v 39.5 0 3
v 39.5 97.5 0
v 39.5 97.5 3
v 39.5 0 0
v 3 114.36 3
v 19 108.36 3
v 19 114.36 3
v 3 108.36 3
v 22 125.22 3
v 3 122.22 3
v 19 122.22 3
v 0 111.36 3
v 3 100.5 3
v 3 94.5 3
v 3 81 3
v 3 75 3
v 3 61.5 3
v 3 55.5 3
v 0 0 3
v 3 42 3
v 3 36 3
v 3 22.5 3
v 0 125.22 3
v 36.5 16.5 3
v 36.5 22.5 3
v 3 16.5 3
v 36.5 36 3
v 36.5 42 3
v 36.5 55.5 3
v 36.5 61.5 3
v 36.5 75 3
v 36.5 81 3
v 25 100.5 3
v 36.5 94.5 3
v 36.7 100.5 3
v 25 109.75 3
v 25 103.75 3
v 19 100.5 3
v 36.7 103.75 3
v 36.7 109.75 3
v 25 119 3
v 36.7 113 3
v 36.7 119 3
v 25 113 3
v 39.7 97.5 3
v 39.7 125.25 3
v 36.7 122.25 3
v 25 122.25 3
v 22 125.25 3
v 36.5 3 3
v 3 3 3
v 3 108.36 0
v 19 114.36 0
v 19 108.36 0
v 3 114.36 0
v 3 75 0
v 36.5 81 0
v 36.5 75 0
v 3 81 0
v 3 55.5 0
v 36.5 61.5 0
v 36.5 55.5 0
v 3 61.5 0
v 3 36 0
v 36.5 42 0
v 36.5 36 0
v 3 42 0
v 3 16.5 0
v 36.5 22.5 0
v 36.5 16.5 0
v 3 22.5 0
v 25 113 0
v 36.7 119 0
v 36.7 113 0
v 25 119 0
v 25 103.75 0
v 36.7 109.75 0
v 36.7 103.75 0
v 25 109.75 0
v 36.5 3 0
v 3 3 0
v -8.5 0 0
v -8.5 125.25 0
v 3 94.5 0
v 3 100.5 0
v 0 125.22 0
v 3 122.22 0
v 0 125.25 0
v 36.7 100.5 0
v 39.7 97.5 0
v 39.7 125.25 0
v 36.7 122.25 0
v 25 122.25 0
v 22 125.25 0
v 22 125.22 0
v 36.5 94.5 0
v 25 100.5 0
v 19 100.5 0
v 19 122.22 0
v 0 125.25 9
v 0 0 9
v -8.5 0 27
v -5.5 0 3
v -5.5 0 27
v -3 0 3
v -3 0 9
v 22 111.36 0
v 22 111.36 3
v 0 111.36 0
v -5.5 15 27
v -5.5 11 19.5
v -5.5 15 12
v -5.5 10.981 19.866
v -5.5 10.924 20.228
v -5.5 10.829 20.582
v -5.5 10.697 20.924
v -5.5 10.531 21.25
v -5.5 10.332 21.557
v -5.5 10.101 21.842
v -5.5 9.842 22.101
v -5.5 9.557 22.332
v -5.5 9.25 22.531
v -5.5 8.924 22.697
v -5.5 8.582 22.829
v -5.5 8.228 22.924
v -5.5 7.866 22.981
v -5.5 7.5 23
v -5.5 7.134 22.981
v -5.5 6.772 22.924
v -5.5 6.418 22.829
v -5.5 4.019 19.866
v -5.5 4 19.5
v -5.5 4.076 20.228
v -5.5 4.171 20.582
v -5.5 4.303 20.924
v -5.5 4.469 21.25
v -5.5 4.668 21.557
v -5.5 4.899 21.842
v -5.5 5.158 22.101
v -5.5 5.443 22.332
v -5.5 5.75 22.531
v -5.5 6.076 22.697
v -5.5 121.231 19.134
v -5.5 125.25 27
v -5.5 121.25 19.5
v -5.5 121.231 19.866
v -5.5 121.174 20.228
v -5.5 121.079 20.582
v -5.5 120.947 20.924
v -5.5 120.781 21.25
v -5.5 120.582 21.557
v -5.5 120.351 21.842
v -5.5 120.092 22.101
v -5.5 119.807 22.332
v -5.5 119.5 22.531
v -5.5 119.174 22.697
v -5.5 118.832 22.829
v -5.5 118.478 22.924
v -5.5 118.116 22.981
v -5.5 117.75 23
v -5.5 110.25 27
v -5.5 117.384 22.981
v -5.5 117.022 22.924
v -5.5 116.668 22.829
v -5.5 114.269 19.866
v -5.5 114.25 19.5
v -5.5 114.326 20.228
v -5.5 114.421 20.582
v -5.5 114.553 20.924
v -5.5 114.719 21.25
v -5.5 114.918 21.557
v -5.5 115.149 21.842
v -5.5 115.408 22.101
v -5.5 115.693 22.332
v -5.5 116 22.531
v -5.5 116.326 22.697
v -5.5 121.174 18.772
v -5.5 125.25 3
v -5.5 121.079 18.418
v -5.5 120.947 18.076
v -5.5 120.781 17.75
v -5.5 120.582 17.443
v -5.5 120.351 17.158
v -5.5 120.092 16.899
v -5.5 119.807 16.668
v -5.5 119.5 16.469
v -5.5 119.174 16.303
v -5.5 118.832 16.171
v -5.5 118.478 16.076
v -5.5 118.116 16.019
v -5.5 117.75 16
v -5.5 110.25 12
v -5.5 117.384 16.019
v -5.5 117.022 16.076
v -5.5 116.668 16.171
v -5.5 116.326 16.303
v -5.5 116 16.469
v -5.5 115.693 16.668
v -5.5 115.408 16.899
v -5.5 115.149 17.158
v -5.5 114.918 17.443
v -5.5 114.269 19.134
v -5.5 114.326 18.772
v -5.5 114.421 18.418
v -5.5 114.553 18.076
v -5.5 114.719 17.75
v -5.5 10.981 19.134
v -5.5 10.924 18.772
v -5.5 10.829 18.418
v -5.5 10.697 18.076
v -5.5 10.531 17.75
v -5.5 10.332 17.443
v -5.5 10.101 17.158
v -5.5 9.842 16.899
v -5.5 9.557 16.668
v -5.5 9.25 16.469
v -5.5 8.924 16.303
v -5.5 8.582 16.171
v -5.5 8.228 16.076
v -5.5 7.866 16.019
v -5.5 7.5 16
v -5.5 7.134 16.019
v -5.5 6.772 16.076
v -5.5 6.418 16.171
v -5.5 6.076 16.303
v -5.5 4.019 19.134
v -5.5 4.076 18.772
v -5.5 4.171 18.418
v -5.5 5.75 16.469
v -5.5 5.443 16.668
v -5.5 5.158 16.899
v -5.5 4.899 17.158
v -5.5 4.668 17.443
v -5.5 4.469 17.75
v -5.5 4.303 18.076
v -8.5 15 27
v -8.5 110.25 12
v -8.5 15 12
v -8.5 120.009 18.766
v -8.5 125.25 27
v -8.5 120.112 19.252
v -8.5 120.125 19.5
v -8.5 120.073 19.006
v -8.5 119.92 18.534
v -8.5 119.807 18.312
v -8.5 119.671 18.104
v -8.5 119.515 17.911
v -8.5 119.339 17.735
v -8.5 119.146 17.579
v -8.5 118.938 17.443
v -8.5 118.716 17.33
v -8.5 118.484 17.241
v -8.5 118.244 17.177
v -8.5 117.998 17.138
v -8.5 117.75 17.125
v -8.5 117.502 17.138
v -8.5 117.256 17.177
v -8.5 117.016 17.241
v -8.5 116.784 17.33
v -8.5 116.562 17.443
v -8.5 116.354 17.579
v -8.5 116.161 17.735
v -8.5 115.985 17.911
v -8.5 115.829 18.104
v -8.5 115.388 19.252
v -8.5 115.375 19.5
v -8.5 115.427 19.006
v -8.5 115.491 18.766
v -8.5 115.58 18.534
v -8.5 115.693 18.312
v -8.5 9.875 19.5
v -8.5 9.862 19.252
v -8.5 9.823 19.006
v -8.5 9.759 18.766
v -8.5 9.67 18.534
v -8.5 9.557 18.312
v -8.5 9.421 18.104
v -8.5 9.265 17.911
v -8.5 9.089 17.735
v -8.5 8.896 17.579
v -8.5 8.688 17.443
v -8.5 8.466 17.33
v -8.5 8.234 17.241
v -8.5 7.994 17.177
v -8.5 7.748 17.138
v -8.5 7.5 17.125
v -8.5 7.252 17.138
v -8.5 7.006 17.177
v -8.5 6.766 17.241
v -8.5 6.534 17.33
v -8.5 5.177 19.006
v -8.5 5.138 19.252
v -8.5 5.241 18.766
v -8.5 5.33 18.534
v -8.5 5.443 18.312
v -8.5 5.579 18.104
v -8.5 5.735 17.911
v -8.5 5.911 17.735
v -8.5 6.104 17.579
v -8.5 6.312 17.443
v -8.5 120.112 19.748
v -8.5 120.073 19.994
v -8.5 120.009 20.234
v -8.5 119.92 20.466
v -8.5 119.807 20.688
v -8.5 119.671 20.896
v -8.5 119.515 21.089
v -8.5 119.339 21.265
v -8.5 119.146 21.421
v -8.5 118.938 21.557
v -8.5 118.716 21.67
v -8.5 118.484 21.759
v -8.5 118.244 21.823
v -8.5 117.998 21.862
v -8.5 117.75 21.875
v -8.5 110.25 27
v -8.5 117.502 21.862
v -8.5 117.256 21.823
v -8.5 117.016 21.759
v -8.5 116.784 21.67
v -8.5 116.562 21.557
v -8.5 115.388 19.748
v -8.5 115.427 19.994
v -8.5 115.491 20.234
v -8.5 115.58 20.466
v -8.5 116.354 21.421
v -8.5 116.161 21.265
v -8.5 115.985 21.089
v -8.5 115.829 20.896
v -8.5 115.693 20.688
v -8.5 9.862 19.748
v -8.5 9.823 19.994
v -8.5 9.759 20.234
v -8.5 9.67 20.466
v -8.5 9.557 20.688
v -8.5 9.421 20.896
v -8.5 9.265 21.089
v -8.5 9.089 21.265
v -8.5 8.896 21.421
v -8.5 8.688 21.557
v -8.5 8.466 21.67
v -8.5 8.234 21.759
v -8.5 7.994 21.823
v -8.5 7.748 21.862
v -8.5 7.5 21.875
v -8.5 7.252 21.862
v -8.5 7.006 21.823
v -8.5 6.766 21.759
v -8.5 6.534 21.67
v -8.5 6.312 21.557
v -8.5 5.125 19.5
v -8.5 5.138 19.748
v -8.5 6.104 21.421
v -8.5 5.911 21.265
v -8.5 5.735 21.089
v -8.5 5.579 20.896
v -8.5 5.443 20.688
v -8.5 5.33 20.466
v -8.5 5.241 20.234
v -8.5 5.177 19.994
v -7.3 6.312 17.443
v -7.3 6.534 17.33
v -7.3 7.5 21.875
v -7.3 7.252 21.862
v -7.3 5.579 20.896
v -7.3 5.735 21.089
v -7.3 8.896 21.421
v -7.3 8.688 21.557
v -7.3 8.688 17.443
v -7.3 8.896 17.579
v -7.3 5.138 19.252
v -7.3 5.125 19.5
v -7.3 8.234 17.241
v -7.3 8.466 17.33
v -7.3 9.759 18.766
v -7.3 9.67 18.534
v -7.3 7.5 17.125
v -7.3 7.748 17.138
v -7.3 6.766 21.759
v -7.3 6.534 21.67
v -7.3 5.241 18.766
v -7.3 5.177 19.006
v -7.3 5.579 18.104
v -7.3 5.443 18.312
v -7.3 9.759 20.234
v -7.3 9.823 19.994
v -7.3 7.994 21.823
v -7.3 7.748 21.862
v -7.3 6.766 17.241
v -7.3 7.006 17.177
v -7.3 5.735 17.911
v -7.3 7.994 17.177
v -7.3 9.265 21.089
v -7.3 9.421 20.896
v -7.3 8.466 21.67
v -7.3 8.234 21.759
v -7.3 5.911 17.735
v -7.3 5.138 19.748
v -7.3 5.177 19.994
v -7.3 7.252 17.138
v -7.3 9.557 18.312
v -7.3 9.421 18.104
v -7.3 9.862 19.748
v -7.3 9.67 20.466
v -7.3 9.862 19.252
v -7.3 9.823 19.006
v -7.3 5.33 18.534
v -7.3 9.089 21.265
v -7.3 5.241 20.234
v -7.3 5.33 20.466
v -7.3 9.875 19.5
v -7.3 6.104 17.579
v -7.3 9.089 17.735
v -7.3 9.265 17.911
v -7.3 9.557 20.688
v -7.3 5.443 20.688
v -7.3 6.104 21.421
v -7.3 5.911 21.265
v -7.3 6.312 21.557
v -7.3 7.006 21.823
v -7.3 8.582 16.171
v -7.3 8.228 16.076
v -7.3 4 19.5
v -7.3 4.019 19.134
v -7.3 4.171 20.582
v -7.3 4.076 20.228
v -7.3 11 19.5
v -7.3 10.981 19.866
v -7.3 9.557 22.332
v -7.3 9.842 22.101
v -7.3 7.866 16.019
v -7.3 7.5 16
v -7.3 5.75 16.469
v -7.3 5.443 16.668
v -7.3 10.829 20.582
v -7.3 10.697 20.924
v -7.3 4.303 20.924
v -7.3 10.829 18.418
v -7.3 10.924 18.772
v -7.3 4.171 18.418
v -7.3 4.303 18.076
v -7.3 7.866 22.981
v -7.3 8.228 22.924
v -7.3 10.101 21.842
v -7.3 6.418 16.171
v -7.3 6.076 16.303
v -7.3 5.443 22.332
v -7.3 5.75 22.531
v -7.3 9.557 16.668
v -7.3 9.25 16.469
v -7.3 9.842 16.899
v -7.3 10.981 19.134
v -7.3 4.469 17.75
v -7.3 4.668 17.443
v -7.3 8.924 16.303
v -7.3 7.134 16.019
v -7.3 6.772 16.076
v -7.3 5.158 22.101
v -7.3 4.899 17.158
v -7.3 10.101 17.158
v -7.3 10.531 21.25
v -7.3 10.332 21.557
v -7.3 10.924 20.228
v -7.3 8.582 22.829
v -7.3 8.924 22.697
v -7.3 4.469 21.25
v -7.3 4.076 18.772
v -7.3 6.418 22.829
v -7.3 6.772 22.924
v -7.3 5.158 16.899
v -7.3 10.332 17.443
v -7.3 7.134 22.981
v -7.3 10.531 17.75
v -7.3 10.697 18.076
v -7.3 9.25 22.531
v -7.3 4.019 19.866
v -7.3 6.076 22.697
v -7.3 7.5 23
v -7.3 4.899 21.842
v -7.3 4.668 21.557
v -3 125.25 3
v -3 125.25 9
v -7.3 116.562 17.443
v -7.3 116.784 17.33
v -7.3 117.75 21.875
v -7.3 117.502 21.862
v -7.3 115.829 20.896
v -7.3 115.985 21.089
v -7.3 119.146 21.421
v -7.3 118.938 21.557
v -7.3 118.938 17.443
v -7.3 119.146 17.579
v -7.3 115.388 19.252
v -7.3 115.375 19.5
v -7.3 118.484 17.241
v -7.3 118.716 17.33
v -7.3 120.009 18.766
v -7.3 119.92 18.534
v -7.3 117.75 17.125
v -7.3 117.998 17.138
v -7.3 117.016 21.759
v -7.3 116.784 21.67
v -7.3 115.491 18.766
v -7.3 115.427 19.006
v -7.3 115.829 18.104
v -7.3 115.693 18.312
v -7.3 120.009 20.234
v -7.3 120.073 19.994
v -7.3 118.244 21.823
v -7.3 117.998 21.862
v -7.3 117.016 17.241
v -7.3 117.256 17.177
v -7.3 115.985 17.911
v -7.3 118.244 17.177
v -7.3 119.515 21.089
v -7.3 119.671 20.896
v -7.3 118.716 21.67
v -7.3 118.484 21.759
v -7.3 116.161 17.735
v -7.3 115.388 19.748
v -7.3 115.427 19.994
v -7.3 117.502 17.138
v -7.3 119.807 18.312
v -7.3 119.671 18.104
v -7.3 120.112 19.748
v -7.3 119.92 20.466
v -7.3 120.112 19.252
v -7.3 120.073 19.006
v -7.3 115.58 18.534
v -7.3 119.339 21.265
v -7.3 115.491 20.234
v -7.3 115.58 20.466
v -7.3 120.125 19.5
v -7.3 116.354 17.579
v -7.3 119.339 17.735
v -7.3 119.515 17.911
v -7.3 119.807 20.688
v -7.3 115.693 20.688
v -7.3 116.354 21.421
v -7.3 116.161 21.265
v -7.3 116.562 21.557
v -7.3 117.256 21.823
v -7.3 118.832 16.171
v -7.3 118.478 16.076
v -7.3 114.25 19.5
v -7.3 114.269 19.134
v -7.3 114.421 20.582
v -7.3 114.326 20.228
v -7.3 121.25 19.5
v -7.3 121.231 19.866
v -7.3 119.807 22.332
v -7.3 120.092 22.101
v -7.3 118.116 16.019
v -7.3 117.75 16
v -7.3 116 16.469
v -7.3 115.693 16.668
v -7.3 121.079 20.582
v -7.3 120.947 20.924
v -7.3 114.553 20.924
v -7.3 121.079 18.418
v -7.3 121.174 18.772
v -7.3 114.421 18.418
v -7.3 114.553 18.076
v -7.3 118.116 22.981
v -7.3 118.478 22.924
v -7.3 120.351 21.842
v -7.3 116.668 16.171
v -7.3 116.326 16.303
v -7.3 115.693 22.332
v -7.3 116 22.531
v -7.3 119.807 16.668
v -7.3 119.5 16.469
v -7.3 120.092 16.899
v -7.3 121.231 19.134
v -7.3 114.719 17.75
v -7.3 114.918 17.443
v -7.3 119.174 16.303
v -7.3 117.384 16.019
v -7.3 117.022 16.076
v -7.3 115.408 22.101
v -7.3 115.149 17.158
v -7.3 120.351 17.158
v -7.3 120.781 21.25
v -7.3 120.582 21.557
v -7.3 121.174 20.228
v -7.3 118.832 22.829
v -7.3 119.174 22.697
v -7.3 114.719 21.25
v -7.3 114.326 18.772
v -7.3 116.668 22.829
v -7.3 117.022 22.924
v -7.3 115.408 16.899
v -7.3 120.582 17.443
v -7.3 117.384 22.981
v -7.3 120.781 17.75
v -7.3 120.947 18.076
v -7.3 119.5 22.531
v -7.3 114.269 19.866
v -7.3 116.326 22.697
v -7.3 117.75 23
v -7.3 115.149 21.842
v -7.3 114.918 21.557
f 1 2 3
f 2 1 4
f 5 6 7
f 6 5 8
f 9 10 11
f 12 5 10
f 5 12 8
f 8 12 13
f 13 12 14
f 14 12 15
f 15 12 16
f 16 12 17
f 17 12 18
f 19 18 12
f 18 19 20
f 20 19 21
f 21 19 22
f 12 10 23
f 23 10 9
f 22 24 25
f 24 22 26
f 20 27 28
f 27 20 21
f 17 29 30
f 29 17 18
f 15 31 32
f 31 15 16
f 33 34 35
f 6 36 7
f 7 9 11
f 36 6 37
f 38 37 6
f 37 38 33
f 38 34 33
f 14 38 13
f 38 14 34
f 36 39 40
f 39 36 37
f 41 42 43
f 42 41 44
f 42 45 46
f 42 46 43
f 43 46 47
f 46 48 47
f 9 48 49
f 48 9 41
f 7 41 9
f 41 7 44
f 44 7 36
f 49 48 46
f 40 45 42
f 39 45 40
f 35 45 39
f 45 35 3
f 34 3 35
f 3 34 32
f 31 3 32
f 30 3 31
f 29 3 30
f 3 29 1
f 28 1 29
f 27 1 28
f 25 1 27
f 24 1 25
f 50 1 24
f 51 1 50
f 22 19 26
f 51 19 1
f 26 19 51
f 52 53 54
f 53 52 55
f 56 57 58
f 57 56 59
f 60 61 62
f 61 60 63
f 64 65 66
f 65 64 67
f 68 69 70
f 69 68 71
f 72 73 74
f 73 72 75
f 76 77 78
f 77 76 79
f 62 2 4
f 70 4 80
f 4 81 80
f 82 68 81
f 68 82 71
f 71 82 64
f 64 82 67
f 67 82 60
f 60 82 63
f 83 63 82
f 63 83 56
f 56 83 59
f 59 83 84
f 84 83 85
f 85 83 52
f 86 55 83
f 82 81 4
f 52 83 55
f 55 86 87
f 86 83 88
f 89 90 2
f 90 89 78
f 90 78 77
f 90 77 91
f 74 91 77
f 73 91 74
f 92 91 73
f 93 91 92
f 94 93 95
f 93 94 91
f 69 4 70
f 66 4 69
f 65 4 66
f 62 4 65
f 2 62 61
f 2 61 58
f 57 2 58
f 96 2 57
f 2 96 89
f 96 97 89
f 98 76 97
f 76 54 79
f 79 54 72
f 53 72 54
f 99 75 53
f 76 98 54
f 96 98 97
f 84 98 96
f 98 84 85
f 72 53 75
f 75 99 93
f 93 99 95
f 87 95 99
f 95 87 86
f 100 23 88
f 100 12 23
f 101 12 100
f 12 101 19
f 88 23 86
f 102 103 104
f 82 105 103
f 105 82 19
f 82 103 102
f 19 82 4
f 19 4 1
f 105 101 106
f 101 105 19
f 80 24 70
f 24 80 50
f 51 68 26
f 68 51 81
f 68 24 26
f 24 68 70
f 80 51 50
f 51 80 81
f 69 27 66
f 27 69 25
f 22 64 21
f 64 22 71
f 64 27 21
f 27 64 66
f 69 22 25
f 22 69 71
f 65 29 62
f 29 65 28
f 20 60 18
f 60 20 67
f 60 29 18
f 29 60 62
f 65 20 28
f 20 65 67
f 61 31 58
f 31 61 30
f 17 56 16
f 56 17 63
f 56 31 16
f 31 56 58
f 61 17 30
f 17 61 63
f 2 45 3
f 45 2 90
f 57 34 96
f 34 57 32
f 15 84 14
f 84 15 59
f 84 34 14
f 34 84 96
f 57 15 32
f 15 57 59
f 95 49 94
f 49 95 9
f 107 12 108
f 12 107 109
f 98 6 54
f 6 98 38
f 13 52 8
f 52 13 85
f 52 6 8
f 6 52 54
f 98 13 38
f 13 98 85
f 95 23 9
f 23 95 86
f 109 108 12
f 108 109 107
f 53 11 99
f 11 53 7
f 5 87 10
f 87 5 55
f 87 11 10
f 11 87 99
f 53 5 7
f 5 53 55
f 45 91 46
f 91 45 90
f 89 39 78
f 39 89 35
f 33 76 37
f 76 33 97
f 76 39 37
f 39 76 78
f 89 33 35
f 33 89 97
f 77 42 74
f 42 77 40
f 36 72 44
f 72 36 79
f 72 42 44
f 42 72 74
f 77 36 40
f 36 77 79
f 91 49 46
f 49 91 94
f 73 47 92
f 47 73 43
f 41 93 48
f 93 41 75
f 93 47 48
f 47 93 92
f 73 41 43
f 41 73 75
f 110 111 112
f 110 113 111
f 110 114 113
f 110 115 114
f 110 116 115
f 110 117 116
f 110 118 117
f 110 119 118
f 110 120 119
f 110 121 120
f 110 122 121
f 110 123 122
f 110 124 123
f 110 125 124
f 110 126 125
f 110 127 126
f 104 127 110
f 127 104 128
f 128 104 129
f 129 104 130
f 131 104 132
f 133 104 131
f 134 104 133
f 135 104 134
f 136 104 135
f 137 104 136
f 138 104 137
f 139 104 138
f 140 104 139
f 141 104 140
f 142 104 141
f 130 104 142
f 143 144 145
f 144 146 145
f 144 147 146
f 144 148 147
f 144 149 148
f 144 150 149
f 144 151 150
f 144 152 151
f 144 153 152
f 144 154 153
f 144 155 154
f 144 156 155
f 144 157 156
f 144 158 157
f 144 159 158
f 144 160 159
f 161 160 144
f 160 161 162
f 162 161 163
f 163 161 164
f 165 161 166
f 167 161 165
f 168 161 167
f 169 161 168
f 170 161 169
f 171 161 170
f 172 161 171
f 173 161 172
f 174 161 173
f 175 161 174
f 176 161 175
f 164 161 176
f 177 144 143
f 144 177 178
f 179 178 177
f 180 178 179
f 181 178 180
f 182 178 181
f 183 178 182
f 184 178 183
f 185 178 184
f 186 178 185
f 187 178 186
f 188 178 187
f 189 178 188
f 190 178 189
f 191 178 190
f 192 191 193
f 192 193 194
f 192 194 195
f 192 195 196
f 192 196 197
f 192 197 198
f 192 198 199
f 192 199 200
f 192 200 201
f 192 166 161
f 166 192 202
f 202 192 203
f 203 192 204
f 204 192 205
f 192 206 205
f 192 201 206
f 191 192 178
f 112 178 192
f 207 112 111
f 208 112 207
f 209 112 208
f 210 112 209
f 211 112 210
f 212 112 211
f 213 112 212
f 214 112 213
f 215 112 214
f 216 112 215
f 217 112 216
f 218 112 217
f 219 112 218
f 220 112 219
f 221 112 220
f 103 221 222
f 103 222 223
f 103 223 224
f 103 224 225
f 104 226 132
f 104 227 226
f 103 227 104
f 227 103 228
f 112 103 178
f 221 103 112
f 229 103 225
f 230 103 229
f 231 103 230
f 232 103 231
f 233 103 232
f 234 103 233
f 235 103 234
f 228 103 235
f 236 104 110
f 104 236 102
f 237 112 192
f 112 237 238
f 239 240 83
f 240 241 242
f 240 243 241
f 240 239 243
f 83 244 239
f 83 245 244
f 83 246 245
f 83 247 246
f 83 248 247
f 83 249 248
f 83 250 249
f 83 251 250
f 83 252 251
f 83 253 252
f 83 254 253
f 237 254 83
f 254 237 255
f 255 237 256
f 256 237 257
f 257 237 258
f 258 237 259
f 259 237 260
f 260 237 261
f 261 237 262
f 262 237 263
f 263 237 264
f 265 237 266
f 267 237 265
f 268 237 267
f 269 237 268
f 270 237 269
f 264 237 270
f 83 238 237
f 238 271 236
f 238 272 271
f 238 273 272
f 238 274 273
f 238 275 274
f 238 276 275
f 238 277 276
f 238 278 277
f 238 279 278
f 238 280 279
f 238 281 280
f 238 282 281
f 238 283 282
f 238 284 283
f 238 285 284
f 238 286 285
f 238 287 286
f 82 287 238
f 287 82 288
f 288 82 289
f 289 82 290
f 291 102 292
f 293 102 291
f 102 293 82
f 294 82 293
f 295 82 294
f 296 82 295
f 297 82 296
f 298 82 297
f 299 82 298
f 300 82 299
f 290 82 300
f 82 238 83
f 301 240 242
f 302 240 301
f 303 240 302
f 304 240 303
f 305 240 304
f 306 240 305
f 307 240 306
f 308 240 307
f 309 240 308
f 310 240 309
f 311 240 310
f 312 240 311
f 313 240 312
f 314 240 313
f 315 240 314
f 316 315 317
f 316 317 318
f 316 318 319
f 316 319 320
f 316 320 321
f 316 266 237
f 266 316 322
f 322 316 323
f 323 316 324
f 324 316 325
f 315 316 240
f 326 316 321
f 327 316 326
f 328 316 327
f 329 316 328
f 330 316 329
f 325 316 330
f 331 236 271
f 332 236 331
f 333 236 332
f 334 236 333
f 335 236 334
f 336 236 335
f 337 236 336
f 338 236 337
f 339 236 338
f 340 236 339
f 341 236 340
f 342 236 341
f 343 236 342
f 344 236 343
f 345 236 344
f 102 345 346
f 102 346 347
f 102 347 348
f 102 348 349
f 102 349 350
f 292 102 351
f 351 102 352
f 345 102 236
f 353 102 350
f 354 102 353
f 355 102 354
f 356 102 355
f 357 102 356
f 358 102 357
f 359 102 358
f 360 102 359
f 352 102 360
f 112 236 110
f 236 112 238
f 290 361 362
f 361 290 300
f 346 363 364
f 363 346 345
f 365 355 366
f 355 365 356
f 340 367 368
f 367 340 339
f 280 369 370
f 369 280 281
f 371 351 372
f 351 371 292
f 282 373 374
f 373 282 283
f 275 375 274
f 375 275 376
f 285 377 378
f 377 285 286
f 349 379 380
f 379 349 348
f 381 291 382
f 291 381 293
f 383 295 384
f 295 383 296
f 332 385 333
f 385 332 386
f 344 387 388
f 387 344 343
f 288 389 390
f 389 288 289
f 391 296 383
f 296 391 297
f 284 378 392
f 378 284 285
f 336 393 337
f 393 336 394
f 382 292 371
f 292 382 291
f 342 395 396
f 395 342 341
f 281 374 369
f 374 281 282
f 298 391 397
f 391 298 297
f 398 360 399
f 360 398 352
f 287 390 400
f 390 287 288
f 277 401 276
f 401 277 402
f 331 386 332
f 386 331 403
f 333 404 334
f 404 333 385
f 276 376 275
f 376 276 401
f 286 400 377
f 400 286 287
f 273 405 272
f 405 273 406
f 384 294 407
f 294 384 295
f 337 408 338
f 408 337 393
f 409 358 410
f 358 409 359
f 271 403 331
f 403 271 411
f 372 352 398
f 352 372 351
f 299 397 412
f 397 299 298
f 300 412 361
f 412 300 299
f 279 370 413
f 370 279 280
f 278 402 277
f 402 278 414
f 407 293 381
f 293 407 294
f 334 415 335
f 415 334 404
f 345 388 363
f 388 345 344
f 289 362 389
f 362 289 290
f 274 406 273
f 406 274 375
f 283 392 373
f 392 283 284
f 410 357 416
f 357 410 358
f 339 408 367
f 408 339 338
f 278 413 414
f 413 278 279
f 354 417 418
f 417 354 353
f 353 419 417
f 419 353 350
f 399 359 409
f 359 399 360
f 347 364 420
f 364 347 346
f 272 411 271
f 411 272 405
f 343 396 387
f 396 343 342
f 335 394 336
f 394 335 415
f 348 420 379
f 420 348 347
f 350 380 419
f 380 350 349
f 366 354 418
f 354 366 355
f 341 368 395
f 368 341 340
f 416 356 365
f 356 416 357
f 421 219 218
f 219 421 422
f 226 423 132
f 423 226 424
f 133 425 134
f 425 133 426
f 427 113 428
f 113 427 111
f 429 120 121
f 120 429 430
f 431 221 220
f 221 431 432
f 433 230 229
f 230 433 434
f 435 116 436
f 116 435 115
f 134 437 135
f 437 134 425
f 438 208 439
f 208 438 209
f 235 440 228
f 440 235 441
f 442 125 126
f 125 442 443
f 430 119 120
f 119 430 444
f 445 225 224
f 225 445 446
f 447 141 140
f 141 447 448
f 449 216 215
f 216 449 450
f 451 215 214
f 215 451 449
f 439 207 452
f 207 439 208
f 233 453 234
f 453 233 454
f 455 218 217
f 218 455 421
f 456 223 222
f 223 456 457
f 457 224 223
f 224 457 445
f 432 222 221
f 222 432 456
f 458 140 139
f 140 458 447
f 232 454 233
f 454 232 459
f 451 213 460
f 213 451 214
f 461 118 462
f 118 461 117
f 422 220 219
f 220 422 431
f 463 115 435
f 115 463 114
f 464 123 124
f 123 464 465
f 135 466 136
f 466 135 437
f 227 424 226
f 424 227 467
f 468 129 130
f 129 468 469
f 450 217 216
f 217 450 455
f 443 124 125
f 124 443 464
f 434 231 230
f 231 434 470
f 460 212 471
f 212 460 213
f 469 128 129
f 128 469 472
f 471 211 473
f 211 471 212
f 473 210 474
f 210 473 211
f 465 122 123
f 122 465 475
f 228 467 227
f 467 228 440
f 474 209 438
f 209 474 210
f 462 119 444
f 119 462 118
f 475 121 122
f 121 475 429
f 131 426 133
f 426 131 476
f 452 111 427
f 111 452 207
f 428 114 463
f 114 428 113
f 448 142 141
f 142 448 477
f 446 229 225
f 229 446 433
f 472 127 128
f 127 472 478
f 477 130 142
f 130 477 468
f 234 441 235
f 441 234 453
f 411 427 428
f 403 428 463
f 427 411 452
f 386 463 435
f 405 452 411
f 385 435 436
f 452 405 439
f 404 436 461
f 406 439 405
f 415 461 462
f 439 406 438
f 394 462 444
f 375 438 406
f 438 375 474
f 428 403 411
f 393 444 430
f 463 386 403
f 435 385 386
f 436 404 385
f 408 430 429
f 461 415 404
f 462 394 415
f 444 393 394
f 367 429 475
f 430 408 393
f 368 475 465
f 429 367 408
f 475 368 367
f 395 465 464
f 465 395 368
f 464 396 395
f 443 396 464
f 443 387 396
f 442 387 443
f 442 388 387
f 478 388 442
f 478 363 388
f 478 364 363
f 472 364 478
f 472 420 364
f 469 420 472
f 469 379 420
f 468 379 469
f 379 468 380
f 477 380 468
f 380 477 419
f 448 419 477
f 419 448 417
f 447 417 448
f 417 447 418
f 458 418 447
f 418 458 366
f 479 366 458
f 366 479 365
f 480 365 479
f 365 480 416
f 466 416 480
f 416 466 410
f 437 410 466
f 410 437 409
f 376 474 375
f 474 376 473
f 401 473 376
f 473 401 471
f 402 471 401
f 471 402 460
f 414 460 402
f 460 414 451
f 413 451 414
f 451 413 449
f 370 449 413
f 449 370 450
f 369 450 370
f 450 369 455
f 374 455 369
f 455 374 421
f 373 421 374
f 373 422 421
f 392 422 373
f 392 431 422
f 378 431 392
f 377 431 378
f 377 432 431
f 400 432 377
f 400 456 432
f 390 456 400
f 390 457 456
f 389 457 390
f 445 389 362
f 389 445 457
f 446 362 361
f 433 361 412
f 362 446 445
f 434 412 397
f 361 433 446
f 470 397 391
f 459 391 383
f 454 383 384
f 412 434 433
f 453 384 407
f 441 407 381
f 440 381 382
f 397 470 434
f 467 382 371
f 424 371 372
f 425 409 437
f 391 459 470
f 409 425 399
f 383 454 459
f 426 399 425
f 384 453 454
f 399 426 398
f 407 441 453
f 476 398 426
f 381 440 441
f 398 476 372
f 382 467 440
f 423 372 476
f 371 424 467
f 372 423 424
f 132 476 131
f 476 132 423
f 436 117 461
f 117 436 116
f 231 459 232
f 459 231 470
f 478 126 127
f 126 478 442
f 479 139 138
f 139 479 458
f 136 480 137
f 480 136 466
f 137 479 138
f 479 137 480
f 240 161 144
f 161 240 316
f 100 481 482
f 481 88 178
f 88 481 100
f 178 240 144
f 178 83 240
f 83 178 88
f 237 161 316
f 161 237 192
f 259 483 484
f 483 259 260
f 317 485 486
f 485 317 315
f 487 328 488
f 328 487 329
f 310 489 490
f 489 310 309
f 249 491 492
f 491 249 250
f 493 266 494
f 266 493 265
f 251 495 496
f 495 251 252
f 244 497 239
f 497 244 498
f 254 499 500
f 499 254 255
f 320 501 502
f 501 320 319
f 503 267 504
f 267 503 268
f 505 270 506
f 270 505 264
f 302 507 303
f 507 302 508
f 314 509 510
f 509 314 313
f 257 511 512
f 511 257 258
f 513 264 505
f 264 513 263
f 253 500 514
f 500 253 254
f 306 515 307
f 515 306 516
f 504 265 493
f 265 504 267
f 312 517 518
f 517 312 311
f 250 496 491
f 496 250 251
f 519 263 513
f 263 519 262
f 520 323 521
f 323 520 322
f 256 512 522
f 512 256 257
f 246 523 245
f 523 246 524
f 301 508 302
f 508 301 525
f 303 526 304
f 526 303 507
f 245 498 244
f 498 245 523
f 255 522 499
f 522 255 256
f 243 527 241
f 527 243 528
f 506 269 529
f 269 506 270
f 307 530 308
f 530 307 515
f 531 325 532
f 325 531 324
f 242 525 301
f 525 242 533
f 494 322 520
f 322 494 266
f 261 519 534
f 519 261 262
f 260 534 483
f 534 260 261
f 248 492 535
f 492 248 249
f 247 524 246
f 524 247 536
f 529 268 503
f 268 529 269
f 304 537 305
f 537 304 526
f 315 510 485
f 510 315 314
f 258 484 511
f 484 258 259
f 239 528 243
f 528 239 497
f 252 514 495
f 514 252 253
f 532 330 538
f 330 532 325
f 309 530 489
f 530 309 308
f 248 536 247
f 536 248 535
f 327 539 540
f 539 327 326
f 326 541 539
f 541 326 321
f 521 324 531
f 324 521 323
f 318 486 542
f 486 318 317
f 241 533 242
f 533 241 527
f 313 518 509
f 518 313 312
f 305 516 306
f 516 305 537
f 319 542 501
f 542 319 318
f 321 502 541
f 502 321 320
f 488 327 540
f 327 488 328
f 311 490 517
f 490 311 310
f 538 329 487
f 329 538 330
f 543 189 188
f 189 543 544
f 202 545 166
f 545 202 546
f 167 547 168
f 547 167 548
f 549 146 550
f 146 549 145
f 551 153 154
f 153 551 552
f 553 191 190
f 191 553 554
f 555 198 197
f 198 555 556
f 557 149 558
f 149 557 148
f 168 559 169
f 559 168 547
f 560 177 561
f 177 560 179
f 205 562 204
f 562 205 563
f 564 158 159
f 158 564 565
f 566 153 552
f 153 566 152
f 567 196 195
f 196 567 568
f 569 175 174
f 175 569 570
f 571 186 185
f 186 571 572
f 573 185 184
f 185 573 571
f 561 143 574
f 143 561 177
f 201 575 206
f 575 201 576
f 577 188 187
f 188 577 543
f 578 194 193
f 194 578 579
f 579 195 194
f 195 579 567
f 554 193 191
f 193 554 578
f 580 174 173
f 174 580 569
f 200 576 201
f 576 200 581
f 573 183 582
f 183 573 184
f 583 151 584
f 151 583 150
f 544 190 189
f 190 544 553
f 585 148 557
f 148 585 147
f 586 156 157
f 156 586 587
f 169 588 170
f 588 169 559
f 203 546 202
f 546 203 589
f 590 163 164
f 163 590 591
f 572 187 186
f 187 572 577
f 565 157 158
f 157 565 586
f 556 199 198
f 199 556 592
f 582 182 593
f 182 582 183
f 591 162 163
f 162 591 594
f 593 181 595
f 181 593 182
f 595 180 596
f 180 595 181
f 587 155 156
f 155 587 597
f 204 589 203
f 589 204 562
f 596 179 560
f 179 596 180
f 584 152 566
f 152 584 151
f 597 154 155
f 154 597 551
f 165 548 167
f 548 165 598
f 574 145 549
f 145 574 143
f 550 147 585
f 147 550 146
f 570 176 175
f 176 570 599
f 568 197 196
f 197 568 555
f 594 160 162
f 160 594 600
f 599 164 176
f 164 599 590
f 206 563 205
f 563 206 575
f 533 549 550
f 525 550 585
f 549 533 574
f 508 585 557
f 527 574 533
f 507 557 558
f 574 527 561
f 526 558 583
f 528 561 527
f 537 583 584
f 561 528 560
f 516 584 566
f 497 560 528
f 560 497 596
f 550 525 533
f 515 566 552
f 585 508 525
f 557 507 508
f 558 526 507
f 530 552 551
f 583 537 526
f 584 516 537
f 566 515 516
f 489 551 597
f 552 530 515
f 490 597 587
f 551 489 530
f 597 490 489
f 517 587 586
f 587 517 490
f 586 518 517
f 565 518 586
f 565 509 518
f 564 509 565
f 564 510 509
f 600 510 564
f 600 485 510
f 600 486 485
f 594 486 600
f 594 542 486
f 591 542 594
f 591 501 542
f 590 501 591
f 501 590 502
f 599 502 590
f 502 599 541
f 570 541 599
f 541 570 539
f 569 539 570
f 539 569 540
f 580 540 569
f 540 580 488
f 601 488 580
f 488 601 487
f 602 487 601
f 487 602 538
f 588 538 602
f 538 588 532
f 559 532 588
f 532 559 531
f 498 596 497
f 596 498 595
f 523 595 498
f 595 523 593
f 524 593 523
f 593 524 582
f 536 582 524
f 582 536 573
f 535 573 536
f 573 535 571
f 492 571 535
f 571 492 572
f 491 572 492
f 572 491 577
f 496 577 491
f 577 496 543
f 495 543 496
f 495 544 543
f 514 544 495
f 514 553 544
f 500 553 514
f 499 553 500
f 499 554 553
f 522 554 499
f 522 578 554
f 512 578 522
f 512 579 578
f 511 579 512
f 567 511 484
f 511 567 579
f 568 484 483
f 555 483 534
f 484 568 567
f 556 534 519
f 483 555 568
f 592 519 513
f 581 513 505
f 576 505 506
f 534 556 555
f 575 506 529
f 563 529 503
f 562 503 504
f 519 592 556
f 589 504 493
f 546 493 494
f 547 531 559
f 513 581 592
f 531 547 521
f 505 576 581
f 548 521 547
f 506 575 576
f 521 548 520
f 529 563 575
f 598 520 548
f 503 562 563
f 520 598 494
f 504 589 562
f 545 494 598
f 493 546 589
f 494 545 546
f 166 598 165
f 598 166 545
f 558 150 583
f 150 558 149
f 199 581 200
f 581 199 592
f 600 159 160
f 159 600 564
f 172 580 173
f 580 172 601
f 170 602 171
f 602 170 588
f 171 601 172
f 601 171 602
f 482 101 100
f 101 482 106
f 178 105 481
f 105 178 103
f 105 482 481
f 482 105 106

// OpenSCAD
$fn = 60;
min_tool_width = 33.5;
min_tool_thickness = 13.5;
num_tools = 5;

tweezer_width = 11.7;
tweezer_thickness = 3.25;

plat_thickness = 3;

knife_width = 16;
knife_thickness = 7.86;

// Pliers, cutters, scissors

for (i=[0:num_tools-1]) {
    translate([0,i*(plat_thickness*2+min_tool_thickness),0])
    difference(){
        cube([min_tool_width+2*plat_thickness, min_tool_thickness+2*plat_thickness, plat_thickness]);
        translate([plat_thickness,plat_thickness,-0.5])cube([min_tool_width, min_tool_thickness, plat_thickness+1]);
    }
}

// Tweezers

tool_tray_width = num_tools*(plat_thickness*2+min_tool_thickness);

for (i=[0:1]) {
    translate([0,i*(knife_thickness + 2*plat_thickness) + tool_tray_width,0])
    difference(){
        cube([knife_width+2*plat_thickness, knife_thickness+2*plat_thickness, plat_thickness]);
        translate([plat_thickness,plat_thickness,-0.5])cube([knife_width, knife_thickness, plat_thickness+1]);
    }
}

// Sharp stuff

translate([2*plat_thickness + knife_width,0,0])
for (i=[0:2]) {
    translate([0,i*(tweezer_thickness + 2*plat_thickness)+tool_tray_width,0])
    difference(){
        cube([tweezer_width+2*plat_thickness, tweezer_thickness+2*plat_thickness, plat_thickness]);
        translate([plat_thickness,plat_thickness,-0.5])cube([tweezer_width, tweezer_thickness, plat_thickness+1]);
    }
}

// Ruler holder

translate([-plat_thickness,0,plat_thickness])
cube([plat_thickness,  3*(tweezer_thickness + 2*plat_thickness)+tool_tray_width, plat_thickness*2]);

translate([-2*plat_thickness - 2.5,0,plat_thickness])
cube([plat_thickness,  3*(tweezer_thickness + 2*plat_thickness)+tool_tray_width, plat_thickness*3]);

translate([-2*plat_thickness -2.5,0,0])
cube([plat_thickness*2 + 2.5,  3*(tweezer_thickness + 2*plat_thickness)+tool_tray_width, plat_thickness]);

// Hanging
for (i=[0:1]) {
    translate([-(2.5 + 2*plat_thickness),i*(3*(tweezer_thickness + 2*plat_thickness)+tool_tray_width - 5*plat_thickness),4*plat_thickness]){
        difference(){
            difference(){
                cube([plat_thickness,  plat_thickness*5, 5*plat_thickness]);
                translate([-2.5*plat_thickness+0.5, 2.5*plat_thickness,2.5*plat_thickness])
                rotate([0,90,0])
                cylinder(h = 3*plat_thickness, r = 4.75/2);
            }
            translate([1.2, 2.5*plat_thickness,2.5*plat_thickness])
            rotate([0,90,0])
            cylinder(h = 3*plat_thickness, r = 7/2);
        }
    }
}
